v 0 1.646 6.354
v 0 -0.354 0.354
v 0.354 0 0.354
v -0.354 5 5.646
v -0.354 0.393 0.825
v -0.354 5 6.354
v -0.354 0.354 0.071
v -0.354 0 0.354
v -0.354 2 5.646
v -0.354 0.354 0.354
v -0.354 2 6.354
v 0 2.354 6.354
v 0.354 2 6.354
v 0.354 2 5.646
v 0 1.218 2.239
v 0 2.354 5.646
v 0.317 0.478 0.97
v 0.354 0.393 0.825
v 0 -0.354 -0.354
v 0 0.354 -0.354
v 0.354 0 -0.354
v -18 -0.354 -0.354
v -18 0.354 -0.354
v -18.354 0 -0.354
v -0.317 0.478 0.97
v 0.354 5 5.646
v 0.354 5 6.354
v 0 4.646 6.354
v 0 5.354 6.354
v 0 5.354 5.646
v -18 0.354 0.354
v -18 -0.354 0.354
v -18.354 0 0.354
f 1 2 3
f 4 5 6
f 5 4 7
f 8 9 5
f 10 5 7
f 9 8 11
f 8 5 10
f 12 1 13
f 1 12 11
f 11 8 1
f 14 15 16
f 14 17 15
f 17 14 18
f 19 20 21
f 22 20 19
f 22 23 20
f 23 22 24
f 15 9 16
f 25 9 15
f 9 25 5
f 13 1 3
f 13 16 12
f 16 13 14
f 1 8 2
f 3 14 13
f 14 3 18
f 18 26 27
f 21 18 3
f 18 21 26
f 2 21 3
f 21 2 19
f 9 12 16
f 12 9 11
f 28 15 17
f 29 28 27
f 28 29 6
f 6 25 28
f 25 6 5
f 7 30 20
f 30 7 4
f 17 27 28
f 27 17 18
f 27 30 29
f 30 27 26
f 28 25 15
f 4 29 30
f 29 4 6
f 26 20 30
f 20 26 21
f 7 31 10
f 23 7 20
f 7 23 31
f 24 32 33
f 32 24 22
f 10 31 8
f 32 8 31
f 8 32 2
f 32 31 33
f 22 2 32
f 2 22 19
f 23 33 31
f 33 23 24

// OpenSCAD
module draw_line(p1,p2,thickness,fn=4){
    $fn=fn;
    
    hull(){
        translate(p1)sphere(thickness/2);
        translate(p2)sphere(thickness/2);
        } 
    }


module polyline_3D(points,thickness,fn=4){
    module polyline3D_inner(points,index){
         if (index<len(points)){
             draw_line(points[index-1],points[index],thickness,fn);
             polyline3D_inner(points,index+1);
         }  
    }
    polyline3D_inner(points,1);
}




a_vector=[0,2,6];
a_point=[[0,0,0],a_vector];

polyline_3D(a_point,1,4);


b_vector=[0,5,6];
b_point=[[0,0,0],b_vector];

polyline_3D(b_point,1,4);


cross_vector=[[0,0,0],cross(a_vector,b_vector)];

polyline_3D(cross_vector,1,4);
